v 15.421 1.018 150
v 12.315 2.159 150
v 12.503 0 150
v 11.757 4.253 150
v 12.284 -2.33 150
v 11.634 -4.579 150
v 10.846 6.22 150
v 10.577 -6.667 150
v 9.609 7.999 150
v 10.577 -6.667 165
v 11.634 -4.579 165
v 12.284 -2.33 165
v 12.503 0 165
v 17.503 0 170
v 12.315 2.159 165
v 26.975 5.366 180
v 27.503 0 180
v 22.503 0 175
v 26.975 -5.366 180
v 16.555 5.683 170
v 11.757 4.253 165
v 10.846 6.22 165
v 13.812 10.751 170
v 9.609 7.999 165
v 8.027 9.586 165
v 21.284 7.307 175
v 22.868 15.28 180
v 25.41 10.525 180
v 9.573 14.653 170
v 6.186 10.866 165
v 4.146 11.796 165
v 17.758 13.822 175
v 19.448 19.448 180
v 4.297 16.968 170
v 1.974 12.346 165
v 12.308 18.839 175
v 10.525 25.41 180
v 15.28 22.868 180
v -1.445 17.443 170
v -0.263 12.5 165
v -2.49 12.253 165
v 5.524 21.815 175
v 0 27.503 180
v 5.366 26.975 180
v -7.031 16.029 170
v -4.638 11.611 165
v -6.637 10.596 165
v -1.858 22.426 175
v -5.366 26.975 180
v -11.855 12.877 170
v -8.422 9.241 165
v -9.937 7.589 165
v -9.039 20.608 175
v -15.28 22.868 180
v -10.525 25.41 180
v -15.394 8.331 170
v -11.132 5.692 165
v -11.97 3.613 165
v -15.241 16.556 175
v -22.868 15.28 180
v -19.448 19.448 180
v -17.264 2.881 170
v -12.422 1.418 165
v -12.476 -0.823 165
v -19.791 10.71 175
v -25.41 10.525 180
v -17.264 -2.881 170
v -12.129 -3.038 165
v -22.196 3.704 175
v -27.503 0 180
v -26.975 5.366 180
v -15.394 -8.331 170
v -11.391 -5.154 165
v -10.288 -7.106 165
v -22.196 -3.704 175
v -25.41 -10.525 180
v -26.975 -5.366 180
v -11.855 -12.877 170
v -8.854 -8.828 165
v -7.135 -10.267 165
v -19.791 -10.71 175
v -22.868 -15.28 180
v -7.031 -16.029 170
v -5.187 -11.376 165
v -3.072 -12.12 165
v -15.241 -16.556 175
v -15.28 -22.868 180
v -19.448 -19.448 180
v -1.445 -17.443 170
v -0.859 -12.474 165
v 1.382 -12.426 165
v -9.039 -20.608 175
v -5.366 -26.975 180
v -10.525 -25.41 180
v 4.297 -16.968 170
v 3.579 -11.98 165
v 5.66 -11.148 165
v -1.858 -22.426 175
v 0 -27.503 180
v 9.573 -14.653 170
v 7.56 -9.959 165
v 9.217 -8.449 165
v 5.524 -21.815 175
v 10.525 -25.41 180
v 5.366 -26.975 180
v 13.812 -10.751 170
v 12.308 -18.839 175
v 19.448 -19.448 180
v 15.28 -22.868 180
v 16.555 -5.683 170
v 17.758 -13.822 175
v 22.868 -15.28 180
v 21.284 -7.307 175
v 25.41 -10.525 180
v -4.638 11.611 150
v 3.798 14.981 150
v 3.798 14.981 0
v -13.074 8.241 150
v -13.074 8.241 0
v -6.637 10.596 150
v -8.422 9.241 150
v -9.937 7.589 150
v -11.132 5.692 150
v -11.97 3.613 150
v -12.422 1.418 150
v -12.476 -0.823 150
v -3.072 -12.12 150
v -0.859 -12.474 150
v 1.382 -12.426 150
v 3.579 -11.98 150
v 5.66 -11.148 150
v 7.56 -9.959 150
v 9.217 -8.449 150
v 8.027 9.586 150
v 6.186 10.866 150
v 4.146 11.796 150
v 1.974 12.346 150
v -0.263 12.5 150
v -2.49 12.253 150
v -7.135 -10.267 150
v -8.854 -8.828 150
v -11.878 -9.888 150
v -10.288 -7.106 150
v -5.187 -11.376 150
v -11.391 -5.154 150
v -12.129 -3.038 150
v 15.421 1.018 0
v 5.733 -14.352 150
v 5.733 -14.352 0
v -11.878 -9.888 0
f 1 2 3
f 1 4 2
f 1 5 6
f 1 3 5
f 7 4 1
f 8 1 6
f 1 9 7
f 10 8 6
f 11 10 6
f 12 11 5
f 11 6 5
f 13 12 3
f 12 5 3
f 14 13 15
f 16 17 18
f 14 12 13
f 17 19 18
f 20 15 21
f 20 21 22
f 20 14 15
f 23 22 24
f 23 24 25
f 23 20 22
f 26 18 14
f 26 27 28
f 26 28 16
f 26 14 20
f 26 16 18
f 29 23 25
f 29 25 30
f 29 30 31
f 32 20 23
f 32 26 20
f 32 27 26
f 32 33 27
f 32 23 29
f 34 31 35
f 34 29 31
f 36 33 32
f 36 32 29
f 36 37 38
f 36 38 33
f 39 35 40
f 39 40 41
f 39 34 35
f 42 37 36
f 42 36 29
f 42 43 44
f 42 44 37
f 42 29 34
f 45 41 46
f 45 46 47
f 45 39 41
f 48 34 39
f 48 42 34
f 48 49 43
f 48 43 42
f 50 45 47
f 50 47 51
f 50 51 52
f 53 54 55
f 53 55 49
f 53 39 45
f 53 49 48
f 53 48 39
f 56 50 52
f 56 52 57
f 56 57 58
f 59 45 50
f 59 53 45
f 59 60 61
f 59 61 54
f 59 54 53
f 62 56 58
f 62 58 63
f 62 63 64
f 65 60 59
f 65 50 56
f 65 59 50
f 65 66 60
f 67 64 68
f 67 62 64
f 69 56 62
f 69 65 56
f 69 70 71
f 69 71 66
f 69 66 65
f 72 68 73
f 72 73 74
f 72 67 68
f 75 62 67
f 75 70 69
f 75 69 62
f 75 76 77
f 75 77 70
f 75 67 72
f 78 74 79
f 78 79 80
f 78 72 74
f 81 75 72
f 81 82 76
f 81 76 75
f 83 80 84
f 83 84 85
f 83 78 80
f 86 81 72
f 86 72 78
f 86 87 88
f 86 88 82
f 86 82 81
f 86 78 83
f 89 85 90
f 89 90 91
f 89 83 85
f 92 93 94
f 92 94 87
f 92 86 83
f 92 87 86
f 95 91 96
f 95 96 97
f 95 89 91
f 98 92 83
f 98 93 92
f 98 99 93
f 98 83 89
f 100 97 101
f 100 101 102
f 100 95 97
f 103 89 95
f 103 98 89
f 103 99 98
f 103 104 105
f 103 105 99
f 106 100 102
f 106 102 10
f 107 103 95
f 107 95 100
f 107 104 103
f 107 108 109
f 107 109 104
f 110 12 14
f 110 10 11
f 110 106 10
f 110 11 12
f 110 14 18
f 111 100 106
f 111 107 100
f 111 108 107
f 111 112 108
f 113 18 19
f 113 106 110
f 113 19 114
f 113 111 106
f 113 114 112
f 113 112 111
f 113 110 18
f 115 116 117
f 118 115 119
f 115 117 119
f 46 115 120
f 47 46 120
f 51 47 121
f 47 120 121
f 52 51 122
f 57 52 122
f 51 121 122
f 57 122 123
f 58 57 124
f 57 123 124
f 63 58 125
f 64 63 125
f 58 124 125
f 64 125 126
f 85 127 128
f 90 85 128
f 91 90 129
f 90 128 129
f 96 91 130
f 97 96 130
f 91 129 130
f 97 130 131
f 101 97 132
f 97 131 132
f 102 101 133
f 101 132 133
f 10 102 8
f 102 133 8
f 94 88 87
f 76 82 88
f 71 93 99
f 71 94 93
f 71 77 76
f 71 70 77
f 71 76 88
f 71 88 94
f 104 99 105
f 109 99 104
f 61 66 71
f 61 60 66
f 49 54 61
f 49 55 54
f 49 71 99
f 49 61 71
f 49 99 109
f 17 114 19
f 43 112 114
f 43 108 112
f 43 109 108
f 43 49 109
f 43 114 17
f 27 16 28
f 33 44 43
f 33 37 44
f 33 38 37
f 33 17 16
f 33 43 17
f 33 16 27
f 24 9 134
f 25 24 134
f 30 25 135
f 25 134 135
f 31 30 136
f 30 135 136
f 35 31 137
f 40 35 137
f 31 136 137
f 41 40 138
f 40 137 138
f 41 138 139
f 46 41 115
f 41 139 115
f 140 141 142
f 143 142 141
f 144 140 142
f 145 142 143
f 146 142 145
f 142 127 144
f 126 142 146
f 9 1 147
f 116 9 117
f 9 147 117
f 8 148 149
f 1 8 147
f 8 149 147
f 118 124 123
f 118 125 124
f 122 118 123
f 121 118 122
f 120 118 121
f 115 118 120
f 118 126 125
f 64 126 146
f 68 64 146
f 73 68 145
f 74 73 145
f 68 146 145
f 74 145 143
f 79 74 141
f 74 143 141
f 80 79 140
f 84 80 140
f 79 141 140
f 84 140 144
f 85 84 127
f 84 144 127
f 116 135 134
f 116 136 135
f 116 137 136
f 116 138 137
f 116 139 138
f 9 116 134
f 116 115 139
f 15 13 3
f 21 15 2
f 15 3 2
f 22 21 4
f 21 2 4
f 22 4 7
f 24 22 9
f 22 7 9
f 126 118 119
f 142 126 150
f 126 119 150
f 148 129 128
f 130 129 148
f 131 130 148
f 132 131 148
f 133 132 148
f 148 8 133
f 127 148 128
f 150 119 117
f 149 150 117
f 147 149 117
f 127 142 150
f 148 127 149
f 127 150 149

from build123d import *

# Parameters (mm, degrees)
F1_DEPTH  = 150
F3_DEPTH  = 15
F3_FACE_R = 12.5031074182
F4_DEPTH  = 15
F4_TAPER  = -45


with BuildPart() as f1:
    # F0 (on Top) → F1 (new body)
    with BuildSketch(Plane.XY):
        Polygon((15.4211589057, 1.0175080366), (3.7976925262, 14.9808209413), (-13.0740558457, 8.2411484845), (-11.8779034096, -9.8875110716), (5.7331078234, -14.3519663908), align=None)
    extrude(amount=F1_DEPTH)

    # F2 (on face) → F3 (join)
    with BuildSketch(Plane.XY.offset(150)):
        with BuildLine():
            ThreePointArc((10.5771332585, -6.6672293454), (12.0119675412, -3.4699179964), (12.5031074182, 0))
            ThreePointArc((12.5031074182, 0), (11.7574524907, 4.2532347737), (9.6094258021, 7.9991643854))
            ThreePointArc((9.6094258021, 7.9991643854), (3.07239751, 12.119738803), (-4.6381823272, 11.6109844463))
            ThreePointArc((-4.6381823272, 11.6109844463), (-10.5771335272, 6.667228919), (-12.4759796348, -0.8231811852))
            ThreePointArc((-12.4759796348, -0.8231811852), (-9.6094258213, -7.9991643624), (-3.0723980071, -12.119738677))
            ThreePointArc((-3.0723980071, -12.119738677), (4.6381814649, -11.6109847907), (10.5771332585, -6.6672293454))
        make_face()
    extrude(amount=F3_DEPTH)

    # F3_face (on face) → F4 (join)
    with BuildSketch(Plane.XY.offset(165)):
        Circle(F3_FACE_R)
    extrude(amount=F4_DEPTH, taper=F4_TAPER)


solid = f1.part
